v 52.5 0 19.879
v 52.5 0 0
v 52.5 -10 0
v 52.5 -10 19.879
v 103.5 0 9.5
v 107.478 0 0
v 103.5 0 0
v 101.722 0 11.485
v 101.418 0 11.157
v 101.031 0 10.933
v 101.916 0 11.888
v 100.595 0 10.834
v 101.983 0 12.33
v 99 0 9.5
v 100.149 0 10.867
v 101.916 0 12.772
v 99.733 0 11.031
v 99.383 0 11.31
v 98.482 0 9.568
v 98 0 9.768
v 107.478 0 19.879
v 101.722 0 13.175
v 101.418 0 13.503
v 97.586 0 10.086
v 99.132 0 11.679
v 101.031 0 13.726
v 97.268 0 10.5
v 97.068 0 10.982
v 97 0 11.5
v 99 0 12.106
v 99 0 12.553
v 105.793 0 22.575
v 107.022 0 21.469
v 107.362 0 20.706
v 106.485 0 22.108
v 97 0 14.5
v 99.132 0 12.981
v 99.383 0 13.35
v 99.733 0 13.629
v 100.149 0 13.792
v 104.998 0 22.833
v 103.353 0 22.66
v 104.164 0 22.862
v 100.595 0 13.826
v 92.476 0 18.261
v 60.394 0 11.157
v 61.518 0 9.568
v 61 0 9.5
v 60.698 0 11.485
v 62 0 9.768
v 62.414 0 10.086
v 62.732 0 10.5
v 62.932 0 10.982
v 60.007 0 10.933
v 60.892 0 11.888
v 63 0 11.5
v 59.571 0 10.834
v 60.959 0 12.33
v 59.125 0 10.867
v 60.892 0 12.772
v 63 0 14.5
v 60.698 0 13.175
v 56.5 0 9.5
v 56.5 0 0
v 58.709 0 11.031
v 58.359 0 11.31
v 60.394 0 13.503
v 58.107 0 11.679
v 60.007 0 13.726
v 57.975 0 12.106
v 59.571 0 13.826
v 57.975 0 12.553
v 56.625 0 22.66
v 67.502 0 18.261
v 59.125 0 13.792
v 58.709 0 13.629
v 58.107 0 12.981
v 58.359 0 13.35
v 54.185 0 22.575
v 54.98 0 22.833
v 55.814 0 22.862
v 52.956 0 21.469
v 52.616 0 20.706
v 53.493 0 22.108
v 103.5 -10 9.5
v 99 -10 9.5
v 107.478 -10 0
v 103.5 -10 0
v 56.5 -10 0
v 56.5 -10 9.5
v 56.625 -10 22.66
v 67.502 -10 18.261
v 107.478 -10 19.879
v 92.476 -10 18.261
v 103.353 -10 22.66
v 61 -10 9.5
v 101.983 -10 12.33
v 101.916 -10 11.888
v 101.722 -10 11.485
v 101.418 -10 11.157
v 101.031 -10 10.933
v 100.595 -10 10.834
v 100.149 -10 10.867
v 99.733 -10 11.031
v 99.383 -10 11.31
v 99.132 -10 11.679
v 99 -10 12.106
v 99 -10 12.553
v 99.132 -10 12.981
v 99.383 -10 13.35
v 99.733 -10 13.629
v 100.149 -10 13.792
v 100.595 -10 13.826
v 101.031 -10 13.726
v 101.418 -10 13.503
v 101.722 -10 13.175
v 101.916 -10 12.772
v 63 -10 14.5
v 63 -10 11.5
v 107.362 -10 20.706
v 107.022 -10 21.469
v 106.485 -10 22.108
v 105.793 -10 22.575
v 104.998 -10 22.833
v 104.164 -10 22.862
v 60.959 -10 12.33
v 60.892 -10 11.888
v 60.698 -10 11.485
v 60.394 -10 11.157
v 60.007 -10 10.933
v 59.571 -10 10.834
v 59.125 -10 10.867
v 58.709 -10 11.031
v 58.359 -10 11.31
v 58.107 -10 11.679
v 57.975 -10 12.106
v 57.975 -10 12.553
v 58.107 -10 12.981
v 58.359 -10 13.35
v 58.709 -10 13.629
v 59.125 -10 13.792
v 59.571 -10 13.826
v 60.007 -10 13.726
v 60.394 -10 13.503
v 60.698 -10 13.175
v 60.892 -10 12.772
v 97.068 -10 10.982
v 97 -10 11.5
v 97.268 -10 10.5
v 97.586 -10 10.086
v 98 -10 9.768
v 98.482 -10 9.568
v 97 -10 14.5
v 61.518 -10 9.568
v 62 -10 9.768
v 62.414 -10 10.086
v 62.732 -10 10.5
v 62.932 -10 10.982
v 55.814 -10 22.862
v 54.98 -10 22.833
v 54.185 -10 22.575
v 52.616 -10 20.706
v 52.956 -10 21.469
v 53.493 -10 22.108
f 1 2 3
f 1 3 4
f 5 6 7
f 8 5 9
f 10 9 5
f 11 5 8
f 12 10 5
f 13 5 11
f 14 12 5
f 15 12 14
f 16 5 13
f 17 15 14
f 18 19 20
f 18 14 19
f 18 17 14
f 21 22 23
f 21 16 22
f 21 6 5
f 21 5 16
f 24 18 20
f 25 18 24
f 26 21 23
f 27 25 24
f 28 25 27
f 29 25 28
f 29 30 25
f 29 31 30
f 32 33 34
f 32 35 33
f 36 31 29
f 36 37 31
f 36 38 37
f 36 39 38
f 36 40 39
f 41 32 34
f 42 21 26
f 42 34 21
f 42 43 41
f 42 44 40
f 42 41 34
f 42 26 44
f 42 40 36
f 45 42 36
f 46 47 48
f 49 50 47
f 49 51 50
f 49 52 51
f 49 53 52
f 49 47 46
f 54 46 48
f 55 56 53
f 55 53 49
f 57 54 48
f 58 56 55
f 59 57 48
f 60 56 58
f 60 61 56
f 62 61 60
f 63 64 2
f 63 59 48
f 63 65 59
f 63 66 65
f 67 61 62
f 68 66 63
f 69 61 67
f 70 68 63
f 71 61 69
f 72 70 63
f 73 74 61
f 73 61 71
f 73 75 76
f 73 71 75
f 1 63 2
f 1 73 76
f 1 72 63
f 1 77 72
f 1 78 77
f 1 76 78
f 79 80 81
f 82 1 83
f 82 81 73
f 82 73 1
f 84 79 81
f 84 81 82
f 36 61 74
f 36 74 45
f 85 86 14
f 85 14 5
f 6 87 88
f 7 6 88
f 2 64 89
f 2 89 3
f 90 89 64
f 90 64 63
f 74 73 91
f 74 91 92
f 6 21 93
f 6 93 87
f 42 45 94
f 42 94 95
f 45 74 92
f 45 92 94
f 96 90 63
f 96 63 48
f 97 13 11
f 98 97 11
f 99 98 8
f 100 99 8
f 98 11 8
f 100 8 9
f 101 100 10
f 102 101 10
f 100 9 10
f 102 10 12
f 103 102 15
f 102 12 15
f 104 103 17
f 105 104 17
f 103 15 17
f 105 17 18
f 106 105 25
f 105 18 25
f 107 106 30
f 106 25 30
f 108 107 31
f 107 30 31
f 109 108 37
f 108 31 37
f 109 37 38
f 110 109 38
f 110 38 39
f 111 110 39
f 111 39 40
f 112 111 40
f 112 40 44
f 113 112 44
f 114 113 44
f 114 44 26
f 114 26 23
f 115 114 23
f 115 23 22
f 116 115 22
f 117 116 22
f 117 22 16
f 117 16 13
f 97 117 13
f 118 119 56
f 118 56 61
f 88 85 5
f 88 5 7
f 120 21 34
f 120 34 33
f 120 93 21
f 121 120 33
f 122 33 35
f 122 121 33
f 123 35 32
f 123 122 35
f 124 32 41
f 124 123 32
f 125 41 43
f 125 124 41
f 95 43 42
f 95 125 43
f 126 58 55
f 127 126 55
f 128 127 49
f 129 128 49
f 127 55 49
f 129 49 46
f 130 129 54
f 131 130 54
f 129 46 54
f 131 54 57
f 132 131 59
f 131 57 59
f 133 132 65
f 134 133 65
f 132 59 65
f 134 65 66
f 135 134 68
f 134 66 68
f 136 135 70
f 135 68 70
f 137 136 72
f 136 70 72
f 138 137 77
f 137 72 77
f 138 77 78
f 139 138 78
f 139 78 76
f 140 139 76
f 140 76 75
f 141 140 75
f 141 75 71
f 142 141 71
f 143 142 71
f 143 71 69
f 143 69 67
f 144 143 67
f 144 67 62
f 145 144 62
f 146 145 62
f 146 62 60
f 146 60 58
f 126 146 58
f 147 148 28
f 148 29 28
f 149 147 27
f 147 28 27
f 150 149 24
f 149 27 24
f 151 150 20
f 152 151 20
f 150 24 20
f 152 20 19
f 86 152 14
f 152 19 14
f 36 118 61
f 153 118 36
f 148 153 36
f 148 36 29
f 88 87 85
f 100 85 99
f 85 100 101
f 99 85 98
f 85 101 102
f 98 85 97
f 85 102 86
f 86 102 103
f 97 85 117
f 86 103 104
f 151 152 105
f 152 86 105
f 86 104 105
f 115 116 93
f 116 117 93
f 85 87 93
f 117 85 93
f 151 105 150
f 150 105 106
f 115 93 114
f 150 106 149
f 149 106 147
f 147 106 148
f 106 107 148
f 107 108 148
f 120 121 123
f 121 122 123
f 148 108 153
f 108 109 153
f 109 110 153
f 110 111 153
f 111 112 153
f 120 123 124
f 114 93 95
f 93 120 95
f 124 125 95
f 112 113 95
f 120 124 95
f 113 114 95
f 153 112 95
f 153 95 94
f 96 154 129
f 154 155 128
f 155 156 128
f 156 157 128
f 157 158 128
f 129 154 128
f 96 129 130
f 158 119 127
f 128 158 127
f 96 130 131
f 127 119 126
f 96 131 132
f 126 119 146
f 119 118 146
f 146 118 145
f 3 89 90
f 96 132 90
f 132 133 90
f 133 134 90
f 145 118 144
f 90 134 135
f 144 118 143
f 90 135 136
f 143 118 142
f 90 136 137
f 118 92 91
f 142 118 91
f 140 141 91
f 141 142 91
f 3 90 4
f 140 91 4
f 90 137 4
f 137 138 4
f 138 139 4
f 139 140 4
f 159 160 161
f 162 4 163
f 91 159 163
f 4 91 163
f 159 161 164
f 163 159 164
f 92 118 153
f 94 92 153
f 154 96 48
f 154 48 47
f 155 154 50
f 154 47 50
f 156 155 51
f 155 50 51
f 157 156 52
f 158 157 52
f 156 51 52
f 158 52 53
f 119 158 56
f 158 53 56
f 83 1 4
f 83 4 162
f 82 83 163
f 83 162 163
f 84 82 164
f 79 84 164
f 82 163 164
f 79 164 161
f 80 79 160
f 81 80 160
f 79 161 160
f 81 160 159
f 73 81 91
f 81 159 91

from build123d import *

# Parameters (mm, degrees)
PAD_DEPTH       = 10
SKETCH001_R     = 1.5
POCKET_DEPTH    = 10.001
FILLET_R        = 3
POCKET001_DEPTH = 10.001
FILLET001_R     = 2


with BuildPart() as part:
    # Sketch → Pad (new body)
    with BuildSketch(Plane.XZ):
        Polygon((52.5, 0), (52.5, 24.328), (67.5019, 18.2611), (92.4761, 18.2611), (107.478, 24.328), (107.478, 0), align=None)
    extrude(amount=PAD_DEPTH)

    # Sketch001 → Pocket (cut, through all)
    with BuildSketch(Plane(origin=(0, 0, 0), x_dir=(1, 0, 0), z_dir=(0, 1, 0))):
        with Locations((100.483, -12.3298)):
            Circle(SKETCH001_R)
        with Locations((59.458744, -12.3298)):
            Circle(SKETCH001_R)
    extrude(amount=-POCKET_DEPTH, mode=Mode.SUBTRACT)

    # Fillet
    fillet_edges = [part.edges().sort_by_distance(p)[0] for p in [
        (52.5, -5, 24.328),
        (107.478, -5, 24.328),
    ]]
    fillet(fillet_edges, radius=FILLET_R)

    # Sketch002 → Pocket001 (cut, through all)
    with BuildSketch(Plane.XZ.offset(10)):
        Polygon((56.5, 0), (56.5, 9.5), (63, 9.5), (63, 14.5), (97, 14.5), (97, 9.5), (103.5, 9.5), (103.5, 0), align=None)
    extrude(amount=-POCKET001_DEPTH, mode=Mode.SUBTRACT)

    # Fillet001
    fillet001_edges = [part.edges().sort_by_distance(p)[0] for p in [
        (63, -5, 9.5),
        (97, -5, 9.5),
    ]]
    fillet(fillet001_edges, radius=FILLET001_R)


solid = part.part
